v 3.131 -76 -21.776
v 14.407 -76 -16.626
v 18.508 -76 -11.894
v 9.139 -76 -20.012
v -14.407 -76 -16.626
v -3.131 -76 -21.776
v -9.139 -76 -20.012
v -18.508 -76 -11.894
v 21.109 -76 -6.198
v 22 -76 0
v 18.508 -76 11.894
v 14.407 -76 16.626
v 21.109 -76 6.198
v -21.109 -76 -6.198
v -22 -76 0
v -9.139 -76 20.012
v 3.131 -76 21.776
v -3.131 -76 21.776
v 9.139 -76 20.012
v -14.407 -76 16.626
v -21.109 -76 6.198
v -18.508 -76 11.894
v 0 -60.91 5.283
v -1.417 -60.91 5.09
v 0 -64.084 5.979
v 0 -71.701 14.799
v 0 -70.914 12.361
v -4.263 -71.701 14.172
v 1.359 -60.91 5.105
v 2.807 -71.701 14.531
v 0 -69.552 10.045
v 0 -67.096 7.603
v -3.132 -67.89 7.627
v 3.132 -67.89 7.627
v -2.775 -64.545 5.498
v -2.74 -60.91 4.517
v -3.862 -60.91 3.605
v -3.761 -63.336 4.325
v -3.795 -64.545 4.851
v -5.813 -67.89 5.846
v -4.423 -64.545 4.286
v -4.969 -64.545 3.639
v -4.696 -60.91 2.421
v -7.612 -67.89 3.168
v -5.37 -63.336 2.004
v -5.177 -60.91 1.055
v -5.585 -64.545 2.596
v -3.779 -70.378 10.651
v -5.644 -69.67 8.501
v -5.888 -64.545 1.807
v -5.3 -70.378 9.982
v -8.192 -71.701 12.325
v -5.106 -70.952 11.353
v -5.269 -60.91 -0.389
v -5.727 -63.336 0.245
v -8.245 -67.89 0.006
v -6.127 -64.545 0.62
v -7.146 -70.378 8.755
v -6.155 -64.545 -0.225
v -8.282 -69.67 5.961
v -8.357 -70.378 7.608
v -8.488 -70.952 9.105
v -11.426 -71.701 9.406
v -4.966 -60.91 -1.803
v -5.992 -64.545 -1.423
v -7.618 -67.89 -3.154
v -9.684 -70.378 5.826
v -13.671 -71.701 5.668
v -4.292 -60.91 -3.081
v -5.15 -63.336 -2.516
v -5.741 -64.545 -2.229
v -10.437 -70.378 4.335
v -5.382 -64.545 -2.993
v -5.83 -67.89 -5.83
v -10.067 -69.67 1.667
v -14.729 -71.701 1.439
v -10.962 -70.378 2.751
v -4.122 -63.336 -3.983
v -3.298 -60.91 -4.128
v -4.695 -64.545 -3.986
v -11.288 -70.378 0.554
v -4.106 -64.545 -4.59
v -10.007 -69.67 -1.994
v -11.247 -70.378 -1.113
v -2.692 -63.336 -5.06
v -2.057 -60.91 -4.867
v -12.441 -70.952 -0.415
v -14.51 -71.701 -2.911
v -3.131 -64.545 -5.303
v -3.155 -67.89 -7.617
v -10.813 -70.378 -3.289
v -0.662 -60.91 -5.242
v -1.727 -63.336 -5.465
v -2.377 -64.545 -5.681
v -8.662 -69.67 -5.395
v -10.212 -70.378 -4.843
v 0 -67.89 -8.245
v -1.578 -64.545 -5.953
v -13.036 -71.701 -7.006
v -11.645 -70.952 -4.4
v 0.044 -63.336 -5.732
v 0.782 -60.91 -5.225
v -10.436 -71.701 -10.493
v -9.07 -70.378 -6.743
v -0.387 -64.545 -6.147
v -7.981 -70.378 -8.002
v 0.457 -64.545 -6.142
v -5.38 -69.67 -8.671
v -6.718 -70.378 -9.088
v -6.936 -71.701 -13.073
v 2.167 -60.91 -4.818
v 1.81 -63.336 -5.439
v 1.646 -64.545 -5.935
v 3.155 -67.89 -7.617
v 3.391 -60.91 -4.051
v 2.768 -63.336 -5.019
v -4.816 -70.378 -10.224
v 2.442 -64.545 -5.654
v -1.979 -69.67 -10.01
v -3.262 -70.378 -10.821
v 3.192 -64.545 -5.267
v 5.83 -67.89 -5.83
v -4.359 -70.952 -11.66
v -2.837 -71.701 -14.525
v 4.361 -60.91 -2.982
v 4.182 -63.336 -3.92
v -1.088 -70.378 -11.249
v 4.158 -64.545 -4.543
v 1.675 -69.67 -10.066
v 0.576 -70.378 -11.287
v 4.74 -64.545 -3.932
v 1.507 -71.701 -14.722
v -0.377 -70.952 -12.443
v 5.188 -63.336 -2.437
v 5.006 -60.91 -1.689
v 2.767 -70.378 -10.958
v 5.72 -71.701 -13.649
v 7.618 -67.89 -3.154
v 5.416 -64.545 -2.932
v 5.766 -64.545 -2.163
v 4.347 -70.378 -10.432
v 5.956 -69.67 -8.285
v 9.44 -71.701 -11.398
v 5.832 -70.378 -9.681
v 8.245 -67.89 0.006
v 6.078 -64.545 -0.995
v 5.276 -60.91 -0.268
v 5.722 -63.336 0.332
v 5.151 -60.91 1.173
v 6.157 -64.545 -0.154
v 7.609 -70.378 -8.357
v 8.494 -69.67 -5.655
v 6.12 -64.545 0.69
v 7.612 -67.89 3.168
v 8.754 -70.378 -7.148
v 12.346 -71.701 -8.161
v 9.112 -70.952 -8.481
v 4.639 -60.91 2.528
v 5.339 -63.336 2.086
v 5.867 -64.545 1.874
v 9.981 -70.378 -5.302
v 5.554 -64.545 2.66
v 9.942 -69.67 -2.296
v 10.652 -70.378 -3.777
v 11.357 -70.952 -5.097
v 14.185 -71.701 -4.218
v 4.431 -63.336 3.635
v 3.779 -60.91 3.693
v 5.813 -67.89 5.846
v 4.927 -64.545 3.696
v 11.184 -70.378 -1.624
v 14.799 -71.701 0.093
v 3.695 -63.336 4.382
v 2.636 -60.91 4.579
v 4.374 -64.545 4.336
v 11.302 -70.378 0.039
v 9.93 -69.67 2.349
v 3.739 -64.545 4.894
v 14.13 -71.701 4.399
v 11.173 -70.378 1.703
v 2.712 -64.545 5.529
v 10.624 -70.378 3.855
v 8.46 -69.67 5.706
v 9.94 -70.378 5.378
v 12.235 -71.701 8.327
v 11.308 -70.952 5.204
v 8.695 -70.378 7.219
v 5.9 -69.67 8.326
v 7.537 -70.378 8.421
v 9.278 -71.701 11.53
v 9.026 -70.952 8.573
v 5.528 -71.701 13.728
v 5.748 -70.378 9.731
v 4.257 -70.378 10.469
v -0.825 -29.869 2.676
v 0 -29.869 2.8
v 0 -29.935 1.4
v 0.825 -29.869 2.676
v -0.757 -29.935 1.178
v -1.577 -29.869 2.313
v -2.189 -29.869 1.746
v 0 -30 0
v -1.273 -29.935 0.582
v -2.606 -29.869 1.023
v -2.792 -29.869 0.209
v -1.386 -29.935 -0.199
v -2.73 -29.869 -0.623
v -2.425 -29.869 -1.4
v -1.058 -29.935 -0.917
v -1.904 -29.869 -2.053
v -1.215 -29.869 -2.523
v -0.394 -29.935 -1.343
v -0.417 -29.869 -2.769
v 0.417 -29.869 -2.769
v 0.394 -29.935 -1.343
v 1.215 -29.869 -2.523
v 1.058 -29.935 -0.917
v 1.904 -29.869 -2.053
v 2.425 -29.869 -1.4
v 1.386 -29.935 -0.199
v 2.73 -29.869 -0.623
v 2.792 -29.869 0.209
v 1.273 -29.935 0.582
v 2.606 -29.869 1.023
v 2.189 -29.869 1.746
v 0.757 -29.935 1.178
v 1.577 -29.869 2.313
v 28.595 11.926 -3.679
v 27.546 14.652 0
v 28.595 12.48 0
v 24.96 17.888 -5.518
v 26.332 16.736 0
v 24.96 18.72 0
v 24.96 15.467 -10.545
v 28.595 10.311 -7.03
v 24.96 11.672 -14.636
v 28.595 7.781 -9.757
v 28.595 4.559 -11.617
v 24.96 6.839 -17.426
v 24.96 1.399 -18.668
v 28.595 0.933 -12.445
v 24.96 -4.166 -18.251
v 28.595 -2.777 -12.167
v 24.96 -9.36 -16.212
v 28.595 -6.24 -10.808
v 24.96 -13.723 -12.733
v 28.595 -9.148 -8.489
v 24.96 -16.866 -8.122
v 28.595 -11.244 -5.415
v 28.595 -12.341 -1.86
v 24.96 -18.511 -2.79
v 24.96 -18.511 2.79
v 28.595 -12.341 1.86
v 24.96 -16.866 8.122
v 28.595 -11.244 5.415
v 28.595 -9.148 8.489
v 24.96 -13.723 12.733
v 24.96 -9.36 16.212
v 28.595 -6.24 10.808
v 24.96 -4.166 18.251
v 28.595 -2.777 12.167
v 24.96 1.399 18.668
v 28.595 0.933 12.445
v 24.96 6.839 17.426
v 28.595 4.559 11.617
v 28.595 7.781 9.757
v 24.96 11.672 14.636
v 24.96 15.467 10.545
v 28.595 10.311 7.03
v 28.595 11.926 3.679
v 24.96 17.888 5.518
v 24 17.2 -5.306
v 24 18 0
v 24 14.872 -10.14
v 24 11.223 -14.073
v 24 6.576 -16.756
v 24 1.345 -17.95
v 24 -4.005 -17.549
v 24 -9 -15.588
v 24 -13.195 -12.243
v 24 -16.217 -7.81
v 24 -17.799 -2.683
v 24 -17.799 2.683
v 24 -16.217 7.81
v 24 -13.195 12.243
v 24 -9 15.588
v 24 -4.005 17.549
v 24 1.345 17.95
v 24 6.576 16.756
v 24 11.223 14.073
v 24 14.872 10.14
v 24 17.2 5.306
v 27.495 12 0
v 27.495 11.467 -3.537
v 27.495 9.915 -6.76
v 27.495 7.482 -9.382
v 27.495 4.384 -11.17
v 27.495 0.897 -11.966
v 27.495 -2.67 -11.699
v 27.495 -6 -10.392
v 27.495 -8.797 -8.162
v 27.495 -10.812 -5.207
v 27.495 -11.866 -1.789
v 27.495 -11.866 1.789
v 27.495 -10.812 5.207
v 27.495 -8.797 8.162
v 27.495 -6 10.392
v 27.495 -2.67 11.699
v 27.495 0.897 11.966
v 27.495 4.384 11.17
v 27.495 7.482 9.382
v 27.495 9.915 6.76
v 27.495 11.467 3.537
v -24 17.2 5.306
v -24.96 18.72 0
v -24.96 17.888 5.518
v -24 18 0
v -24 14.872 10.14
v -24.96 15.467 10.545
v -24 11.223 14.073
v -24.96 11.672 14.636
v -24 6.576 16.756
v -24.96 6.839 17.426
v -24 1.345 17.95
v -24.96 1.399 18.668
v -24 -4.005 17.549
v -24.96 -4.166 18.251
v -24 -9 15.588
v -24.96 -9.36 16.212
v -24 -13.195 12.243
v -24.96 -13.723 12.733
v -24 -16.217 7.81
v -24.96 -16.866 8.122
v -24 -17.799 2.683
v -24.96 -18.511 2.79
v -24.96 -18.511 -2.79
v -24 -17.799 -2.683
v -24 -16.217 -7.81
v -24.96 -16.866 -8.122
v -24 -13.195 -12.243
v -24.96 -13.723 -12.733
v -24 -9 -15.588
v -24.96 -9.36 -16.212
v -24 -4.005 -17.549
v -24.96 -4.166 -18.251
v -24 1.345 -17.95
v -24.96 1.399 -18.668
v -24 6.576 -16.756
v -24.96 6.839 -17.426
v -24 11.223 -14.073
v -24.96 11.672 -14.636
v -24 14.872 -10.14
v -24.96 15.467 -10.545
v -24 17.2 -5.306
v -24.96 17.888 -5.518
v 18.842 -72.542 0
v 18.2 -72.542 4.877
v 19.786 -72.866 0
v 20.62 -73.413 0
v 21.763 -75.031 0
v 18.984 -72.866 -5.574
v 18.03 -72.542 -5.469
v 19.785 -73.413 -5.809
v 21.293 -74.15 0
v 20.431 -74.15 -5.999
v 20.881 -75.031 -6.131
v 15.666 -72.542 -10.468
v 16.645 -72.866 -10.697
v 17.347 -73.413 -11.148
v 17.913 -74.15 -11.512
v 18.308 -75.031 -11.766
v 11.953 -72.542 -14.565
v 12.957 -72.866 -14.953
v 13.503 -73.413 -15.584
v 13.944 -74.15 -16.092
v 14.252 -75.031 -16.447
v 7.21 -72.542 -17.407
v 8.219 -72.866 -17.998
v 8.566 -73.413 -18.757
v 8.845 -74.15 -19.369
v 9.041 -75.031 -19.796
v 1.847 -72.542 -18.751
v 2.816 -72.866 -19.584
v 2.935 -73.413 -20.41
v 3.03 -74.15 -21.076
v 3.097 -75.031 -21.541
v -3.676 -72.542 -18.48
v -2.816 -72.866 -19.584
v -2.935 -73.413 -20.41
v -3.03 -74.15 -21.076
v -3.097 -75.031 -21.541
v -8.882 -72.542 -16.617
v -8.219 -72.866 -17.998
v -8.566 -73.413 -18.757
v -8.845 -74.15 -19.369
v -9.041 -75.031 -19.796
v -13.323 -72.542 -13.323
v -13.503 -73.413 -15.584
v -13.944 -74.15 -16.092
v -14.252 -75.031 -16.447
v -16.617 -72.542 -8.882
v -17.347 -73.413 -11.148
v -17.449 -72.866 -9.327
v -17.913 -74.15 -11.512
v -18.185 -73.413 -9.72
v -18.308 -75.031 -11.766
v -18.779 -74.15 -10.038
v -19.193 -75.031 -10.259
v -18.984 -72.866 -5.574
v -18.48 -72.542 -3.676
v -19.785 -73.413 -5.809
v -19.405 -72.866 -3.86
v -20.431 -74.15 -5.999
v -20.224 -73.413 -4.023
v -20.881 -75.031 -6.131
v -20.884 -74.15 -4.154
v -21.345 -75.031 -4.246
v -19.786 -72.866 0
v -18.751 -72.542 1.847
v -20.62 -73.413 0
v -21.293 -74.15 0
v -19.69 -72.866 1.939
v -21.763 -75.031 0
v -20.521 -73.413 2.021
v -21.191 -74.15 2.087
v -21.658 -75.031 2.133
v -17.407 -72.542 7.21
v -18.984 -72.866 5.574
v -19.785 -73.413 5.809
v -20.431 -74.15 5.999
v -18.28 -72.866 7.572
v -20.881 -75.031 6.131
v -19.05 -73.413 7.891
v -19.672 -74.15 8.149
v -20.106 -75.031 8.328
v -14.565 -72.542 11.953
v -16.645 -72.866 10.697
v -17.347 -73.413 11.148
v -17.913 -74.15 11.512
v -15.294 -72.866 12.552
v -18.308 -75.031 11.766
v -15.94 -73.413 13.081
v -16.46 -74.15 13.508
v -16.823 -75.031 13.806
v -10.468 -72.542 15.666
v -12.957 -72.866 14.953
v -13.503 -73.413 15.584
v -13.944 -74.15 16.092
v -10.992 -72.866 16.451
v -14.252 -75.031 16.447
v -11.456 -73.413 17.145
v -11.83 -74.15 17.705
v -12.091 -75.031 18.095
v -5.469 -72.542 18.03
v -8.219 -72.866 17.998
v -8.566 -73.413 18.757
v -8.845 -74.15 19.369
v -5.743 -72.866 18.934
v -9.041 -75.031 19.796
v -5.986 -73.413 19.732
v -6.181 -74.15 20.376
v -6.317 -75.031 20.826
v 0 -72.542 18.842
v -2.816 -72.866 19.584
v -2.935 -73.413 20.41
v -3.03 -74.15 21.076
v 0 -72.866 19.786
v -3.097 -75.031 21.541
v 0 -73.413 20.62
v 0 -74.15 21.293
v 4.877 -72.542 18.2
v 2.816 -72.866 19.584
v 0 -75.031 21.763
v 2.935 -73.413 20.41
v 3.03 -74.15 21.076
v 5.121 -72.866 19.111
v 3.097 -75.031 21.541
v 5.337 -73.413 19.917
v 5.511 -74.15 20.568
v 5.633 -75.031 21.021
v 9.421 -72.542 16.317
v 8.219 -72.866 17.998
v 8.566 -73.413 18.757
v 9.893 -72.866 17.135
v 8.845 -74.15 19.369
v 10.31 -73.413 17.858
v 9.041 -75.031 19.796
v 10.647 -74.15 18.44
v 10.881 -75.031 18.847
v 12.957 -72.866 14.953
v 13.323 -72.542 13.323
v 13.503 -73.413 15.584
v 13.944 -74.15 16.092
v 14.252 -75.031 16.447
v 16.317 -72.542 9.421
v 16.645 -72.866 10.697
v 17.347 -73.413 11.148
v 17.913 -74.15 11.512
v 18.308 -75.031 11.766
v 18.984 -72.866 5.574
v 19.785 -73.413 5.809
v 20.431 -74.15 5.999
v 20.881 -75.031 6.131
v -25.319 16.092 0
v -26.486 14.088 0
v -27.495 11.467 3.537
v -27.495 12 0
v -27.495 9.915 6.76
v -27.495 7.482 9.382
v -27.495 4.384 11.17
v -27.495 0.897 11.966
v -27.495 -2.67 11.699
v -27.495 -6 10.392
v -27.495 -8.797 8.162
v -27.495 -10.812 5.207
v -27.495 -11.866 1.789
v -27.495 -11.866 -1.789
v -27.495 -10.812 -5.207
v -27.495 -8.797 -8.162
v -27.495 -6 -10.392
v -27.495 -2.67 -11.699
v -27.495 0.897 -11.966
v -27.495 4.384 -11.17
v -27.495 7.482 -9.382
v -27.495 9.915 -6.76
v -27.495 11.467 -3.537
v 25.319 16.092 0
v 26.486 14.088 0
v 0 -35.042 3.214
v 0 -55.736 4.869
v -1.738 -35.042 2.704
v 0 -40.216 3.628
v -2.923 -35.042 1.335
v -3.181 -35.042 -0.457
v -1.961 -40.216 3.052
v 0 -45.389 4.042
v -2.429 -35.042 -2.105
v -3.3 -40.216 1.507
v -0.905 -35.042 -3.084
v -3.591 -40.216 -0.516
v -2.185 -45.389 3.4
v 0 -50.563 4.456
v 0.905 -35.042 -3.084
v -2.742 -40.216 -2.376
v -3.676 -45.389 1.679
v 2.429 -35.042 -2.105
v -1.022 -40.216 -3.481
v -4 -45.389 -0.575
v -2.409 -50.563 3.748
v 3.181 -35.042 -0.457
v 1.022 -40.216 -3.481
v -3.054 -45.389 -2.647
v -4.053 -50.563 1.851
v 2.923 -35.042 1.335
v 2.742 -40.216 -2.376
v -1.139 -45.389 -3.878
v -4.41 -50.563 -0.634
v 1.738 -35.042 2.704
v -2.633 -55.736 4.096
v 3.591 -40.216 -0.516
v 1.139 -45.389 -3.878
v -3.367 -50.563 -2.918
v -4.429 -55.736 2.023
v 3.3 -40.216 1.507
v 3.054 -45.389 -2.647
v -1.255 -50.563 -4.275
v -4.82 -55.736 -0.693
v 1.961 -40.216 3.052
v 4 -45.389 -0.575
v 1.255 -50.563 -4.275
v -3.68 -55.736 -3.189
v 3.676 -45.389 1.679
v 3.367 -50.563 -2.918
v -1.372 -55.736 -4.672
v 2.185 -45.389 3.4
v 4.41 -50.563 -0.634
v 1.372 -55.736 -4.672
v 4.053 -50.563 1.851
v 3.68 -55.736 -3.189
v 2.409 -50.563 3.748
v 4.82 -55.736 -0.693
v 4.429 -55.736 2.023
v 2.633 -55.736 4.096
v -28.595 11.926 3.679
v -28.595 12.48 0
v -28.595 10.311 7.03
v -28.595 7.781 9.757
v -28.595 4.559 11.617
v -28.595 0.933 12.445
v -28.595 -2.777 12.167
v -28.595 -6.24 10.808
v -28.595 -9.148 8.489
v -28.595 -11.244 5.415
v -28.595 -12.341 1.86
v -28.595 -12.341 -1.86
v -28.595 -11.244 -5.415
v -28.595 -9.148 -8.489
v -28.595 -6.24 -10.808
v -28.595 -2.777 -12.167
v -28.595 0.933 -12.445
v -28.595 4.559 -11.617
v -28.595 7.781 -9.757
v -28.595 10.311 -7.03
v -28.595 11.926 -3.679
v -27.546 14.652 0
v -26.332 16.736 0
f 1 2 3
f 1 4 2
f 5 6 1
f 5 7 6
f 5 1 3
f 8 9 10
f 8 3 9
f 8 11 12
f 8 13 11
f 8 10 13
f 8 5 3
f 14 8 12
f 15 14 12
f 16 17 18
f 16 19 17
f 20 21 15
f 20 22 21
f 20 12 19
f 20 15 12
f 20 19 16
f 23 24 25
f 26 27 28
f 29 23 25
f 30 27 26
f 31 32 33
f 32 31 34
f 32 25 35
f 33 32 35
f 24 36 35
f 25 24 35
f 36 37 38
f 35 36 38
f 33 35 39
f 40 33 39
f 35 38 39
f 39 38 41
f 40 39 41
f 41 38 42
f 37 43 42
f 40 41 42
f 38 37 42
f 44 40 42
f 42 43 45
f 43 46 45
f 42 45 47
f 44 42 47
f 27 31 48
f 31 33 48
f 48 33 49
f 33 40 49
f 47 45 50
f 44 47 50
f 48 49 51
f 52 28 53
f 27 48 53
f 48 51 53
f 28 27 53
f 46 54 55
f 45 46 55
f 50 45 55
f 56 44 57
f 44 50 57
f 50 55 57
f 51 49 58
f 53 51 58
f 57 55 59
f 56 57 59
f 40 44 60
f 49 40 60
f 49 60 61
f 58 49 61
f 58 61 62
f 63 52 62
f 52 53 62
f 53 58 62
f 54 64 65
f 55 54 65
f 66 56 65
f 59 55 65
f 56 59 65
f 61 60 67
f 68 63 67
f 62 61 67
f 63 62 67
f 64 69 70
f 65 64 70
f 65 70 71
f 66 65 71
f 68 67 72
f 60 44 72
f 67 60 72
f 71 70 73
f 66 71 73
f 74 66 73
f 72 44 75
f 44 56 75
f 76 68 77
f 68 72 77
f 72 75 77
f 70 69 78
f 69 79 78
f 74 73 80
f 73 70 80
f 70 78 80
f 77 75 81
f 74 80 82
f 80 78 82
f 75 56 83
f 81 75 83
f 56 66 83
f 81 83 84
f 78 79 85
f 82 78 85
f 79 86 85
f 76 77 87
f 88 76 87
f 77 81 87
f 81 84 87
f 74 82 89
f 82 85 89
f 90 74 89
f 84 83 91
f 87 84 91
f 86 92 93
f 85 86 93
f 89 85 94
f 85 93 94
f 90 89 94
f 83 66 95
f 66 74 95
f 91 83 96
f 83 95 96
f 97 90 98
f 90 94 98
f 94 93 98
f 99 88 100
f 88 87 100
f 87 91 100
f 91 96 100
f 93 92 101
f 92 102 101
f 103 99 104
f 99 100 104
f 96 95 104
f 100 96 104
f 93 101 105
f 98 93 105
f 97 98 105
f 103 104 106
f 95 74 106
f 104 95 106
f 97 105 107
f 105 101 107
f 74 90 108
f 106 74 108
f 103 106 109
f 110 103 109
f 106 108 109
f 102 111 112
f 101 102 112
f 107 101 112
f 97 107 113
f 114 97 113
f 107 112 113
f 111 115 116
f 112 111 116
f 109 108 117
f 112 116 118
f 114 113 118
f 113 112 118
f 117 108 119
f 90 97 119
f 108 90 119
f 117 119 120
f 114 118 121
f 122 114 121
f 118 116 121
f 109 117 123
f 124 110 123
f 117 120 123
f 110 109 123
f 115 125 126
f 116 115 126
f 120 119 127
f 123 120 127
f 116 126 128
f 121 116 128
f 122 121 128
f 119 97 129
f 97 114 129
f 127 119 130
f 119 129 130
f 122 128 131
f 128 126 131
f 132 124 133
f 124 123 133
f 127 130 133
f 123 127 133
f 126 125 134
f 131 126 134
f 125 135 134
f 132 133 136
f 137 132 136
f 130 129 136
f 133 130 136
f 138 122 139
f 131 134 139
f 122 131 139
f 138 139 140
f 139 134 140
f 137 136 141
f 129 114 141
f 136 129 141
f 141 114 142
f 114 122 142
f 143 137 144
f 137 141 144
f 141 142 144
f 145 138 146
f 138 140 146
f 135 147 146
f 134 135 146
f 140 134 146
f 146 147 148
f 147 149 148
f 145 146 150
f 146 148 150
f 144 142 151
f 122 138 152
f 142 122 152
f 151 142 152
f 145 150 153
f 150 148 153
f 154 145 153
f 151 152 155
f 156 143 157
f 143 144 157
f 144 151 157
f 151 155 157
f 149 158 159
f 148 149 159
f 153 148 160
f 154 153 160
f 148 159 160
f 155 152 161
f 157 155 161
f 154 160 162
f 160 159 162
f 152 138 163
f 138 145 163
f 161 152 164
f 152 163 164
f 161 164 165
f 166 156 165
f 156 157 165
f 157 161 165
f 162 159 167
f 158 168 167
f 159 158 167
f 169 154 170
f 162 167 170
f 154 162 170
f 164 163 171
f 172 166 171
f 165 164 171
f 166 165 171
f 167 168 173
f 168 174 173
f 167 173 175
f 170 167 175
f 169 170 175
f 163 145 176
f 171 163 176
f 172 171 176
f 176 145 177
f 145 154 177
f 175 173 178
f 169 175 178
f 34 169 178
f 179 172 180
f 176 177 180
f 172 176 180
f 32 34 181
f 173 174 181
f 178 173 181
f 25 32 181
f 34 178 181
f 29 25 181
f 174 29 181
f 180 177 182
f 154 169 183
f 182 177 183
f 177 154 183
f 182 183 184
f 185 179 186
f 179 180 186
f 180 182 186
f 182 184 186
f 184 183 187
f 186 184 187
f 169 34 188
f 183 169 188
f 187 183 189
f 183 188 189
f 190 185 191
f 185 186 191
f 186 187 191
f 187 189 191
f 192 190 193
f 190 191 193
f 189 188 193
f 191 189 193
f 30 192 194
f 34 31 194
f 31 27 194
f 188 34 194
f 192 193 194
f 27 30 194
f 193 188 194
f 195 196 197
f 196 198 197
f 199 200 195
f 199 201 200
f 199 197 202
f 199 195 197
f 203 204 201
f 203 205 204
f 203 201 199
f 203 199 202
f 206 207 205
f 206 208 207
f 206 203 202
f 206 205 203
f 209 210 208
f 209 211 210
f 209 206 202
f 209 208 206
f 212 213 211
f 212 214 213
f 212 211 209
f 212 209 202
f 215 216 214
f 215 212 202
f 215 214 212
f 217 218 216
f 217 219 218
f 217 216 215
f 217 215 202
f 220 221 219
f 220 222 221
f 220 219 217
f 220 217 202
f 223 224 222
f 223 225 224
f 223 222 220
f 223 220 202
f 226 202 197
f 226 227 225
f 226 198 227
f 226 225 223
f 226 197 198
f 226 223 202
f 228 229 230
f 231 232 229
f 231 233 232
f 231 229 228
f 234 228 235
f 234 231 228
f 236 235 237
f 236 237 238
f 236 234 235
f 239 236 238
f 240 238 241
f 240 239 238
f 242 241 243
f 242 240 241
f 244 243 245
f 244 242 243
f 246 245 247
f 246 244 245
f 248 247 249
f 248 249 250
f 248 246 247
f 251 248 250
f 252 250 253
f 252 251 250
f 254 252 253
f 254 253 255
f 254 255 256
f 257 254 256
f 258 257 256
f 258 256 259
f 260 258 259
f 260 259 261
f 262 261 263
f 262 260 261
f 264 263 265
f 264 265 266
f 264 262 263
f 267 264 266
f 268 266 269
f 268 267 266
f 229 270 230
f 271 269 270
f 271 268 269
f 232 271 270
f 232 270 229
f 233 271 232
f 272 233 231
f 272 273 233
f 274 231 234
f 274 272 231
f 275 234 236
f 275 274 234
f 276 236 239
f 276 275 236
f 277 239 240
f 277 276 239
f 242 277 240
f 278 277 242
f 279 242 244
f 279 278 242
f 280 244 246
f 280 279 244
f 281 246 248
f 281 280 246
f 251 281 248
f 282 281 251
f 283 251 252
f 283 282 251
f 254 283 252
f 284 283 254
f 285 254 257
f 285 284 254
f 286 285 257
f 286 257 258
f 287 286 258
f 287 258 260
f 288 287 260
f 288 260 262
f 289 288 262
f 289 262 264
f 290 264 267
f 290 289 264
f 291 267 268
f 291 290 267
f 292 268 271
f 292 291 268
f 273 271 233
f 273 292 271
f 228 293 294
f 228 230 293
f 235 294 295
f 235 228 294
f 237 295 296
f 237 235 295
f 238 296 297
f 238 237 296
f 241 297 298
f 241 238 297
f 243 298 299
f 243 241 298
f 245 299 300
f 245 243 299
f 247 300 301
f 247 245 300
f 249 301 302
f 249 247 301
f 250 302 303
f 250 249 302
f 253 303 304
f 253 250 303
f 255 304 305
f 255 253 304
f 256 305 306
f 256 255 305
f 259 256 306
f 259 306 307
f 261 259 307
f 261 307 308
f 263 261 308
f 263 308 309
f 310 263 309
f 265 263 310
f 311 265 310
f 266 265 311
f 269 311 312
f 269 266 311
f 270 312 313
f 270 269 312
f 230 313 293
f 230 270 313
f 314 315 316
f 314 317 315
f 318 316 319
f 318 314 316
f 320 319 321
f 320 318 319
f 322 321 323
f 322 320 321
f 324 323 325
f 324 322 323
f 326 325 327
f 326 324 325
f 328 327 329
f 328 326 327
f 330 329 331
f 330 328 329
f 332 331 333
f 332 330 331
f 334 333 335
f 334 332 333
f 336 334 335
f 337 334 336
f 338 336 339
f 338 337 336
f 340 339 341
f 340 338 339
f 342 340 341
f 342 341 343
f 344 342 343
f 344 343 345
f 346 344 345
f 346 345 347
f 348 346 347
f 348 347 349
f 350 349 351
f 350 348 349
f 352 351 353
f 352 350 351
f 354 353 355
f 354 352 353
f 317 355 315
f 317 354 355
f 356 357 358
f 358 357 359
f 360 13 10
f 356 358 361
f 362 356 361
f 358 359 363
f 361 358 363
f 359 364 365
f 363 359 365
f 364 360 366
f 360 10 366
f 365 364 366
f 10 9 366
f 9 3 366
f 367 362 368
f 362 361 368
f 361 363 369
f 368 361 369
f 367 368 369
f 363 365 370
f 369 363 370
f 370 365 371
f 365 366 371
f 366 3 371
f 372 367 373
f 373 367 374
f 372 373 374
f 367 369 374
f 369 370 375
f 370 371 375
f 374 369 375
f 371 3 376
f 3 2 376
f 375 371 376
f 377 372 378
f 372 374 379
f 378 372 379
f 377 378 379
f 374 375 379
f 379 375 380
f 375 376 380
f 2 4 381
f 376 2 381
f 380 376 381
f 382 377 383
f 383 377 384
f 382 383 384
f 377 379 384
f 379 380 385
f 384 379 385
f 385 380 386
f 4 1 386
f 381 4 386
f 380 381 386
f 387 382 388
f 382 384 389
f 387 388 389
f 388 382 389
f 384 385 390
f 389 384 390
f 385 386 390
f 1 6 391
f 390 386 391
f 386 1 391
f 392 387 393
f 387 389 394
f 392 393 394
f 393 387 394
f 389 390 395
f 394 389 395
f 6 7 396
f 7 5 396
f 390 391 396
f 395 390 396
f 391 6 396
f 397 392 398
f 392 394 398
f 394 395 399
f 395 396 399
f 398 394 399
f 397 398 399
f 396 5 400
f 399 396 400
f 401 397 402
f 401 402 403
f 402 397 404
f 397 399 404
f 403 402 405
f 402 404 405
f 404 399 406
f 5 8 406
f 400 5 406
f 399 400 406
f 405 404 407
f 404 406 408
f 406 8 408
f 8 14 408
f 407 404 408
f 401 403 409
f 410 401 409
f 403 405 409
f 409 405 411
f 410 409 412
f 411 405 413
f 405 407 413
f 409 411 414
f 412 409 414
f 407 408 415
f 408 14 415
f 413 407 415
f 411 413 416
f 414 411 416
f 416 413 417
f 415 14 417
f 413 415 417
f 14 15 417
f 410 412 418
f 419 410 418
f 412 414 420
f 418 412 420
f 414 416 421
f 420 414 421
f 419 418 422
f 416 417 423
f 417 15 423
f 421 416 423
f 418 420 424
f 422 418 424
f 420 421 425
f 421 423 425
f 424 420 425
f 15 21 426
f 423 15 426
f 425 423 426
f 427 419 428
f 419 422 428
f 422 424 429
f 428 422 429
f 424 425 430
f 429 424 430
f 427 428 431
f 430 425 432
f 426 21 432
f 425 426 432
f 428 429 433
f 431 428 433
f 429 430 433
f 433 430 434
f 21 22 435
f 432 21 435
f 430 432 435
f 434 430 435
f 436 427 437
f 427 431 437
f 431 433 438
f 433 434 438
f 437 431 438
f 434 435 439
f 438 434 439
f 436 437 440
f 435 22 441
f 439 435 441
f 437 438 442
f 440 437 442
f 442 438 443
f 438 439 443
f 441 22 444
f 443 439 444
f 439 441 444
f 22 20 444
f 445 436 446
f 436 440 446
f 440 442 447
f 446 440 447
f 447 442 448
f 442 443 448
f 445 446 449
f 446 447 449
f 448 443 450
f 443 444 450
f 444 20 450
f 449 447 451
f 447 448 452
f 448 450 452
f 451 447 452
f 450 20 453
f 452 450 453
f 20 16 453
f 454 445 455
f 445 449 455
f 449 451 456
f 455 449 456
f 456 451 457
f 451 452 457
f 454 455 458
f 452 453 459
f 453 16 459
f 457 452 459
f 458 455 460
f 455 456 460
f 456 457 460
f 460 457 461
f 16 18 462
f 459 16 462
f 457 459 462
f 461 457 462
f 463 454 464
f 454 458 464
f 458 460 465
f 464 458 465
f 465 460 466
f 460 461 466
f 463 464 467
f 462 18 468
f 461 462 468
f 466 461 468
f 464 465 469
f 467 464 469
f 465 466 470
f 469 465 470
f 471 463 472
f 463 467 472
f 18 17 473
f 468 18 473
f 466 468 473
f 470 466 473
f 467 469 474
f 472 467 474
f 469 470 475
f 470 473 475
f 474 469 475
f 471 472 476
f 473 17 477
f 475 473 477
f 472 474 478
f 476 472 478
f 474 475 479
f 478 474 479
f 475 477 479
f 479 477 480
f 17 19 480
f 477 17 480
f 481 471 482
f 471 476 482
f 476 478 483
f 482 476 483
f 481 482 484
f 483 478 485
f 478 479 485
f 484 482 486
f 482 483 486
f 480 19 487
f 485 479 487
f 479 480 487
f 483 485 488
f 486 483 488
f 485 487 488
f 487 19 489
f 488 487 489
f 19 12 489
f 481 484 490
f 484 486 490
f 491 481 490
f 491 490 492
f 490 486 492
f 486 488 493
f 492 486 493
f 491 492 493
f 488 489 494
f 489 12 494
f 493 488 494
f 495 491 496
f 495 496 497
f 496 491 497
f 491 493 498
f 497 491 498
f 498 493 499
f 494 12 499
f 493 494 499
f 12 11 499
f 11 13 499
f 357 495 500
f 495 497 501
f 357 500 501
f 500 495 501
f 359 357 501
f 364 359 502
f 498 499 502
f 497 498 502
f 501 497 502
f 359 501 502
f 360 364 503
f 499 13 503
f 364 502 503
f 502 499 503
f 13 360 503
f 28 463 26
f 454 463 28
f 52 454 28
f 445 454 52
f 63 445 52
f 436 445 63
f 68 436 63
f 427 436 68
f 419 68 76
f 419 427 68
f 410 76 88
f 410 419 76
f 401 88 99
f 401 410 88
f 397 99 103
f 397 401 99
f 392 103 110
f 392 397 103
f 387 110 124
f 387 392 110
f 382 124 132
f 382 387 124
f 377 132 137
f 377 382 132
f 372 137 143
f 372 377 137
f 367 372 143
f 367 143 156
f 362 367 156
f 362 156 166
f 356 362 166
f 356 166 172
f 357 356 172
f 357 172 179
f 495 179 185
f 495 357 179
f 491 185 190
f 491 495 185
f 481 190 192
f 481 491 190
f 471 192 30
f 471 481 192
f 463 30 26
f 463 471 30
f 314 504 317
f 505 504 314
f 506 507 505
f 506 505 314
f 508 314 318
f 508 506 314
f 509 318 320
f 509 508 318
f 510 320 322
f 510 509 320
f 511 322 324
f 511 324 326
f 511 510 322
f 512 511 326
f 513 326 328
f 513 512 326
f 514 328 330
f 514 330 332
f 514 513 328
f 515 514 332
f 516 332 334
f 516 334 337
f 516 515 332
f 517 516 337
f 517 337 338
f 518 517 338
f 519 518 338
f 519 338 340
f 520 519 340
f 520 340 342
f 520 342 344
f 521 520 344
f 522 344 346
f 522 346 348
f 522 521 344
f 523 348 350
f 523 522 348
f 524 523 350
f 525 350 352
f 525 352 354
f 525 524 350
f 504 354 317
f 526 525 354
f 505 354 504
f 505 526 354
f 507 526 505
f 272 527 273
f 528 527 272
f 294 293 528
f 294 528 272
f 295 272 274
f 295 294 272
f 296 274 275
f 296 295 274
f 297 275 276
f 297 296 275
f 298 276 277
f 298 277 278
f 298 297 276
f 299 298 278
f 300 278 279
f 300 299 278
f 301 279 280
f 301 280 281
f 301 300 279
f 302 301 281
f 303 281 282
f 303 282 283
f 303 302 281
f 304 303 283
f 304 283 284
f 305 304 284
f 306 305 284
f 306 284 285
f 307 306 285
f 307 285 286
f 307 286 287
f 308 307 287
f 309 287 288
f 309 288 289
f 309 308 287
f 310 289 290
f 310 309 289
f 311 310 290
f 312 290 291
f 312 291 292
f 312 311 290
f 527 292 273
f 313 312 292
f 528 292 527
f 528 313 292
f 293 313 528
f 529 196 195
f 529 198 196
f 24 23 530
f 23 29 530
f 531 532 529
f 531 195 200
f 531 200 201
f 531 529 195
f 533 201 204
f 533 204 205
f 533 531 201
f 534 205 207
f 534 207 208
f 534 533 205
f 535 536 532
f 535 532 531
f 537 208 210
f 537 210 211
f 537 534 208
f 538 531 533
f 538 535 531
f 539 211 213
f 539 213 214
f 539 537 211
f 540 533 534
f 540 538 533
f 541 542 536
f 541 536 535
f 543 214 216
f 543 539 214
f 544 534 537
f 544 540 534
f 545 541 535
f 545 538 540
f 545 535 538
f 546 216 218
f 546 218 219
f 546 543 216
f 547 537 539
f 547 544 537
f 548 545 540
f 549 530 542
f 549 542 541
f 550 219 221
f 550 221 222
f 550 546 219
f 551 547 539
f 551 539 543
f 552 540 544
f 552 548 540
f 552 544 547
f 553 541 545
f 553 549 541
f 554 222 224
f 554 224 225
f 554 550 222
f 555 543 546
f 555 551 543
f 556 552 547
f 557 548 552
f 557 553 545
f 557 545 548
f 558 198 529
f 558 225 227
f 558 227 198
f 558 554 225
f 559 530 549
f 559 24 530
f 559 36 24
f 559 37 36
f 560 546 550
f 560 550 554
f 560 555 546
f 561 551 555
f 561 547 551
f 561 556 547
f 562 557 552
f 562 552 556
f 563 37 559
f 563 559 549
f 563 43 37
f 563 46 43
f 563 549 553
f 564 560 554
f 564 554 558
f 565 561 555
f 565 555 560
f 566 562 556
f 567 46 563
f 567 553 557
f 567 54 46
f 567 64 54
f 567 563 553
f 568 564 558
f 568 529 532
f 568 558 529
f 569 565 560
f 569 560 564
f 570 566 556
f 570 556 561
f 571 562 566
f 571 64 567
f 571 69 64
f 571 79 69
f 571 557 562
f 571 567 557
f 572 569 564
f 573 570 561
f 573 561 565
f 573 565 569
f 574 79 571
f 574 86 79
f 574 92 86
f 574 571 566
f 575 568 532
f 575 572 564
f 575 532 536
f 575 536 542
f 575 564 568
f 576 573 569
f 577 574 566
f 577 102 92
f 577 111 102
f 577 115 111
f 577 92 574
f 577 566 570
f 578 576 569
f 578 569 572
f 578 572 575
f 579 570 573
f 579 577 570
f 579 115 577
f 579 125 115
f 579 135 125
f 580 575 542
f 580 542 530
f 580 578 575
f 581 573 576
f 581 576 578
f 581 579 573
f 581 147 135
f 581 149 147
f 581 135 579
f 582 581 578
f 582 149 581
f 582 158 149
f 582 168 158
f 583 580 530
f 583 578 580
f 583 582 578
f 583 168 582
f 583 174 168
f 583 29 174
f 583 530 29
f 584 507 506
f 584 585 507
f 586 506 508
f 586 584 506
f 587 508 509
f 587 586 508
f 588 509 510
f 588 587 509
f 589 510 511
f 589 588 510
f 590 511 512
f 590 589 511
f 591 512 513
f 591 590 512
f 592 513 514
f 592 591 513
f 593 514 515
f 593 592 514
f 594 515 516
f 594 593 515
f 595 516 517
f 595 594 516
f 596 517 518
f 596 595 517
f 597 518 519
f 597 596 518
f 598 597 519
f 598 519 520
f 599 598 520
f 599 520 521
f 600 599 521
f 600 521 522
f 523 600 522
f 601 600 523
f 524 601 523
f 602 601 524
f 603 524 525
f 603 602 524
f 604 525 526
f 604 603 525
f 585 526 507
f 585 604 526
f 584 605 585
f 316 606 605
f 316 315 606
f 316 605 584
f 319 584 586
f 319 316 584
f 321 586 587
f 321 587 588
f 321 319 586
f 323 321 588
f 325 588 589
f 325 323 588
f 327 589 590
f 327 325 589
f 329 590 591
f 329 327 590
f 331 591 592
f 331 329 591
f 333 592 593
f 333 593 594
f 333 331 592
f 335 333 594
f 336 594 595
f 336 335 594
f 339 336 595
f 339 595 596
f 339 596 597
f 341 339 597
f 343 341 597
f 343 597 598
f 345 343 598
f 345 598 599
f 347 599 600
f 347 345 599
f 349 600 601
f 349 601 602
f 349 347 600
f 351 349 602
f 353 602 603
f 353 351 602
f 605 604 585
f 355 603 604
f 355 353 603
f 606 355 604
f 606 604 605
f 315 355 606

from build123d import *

# Parameters (mm, degrees)
FILLET2_R      = 30
THICKEN2_ANGLE = 180
SCALE7_SCALE   = 0.4


with BuildPart() as part:
    # Sketch3 → Revolve1 (revolve)
    with BuildSketch(Plane(origin=(0, 0, 0), x_dir=(0, 0, -1), z_dir=(1, 0, 0)), mode=Mode.PRIVATE) as revolve1_sk:
        Polygon((0, -75), (7, -74.67261881), (15, -174.67261881), (55, -183), (55, -190), (0, -190), align=None)
    revolve(revolve1_sk.sketch.rotate(Axis((0, 0, 0), (0, -1, 0)), 180), axis=Axis((0, 0, 0), (0, -1, 0)))

    # Fillet1: read off the stored shape, not the designer's step
    # Fillet1 outline → Fillet1 (revolve, cut)
    with BuildSketch(Plane.XY):
        with BuildLine():
            Line((55, -181.356187813), (47.104061772, -181.356187813))
            ThreePointArc((47.104061772, -181.356187813), (52.449170173, -184.401836942), (55, -190))
            Line((55, -190), (55, -181.356187813))
        make_face()
    revolve(axis=Axis((0, 0, 0), (0, 1, 0)), mode=Mode.SUBTRACT)

    # Fillet2
    fillet2_edges = [part.edges().sort_by_distance(p)[0] for p in [
        (0, -174.67261881, -15),
    ]]
    fillet(fillet2_edges, radius=FILLET2_R)


with BuildPart() as body_2:
    # Thicken1: read off the stored shape, not the designer's step
    # Thicken1 outline → Thicken1 (revolve)
    with BuildSketch(Plane.YX):
        with BuildLine():
            Line((46.800000062, -62.399999953), (45.00000006, -59.999999955))
            ThreePointArc((45.00000006, -59.999999955), (37.753687731, -64.804776543), (29.999999931, -68.738635454))
            Line((29.999999931, -68.738635454), (31.199999929, -71.488180873))
            ThreePointArc((31.199999929, -71.488180873), (39.26383524, -67.396967604), (46.800000062, -62.399999953))
        make_face()
    revolve(axis=Axis((0, 0, 0), (1, 0, 0)))


with BuildPart() as body_3:
    # Thicken2: read off the stored shape, not the designer's step
    # Thicken2: copy of body 2
    add(body_2.part.rotate(Axis((0, 0, 0), (0, 1, 0)), THICKEN2_ANGLE))


with BuildPart() as body_3_1:
    # Scale7: scaled about (0, 0, 0)
    add(body_3.part.scale(SCALE7_SCALE))


with BuildPart() as part_1:
    # Scale7: scaled about (0, 0, 0)
    add(part.part.scale(SCALE7_SCALE))


with BuildPart() as body_2_1:
    # Scale7: scaled about (0, 0, 0)
    add(body_2.part.scale(SCALE7_SCALE))


solid = Compound([body_3_1.part, part_1.part, body_2_1.part])
